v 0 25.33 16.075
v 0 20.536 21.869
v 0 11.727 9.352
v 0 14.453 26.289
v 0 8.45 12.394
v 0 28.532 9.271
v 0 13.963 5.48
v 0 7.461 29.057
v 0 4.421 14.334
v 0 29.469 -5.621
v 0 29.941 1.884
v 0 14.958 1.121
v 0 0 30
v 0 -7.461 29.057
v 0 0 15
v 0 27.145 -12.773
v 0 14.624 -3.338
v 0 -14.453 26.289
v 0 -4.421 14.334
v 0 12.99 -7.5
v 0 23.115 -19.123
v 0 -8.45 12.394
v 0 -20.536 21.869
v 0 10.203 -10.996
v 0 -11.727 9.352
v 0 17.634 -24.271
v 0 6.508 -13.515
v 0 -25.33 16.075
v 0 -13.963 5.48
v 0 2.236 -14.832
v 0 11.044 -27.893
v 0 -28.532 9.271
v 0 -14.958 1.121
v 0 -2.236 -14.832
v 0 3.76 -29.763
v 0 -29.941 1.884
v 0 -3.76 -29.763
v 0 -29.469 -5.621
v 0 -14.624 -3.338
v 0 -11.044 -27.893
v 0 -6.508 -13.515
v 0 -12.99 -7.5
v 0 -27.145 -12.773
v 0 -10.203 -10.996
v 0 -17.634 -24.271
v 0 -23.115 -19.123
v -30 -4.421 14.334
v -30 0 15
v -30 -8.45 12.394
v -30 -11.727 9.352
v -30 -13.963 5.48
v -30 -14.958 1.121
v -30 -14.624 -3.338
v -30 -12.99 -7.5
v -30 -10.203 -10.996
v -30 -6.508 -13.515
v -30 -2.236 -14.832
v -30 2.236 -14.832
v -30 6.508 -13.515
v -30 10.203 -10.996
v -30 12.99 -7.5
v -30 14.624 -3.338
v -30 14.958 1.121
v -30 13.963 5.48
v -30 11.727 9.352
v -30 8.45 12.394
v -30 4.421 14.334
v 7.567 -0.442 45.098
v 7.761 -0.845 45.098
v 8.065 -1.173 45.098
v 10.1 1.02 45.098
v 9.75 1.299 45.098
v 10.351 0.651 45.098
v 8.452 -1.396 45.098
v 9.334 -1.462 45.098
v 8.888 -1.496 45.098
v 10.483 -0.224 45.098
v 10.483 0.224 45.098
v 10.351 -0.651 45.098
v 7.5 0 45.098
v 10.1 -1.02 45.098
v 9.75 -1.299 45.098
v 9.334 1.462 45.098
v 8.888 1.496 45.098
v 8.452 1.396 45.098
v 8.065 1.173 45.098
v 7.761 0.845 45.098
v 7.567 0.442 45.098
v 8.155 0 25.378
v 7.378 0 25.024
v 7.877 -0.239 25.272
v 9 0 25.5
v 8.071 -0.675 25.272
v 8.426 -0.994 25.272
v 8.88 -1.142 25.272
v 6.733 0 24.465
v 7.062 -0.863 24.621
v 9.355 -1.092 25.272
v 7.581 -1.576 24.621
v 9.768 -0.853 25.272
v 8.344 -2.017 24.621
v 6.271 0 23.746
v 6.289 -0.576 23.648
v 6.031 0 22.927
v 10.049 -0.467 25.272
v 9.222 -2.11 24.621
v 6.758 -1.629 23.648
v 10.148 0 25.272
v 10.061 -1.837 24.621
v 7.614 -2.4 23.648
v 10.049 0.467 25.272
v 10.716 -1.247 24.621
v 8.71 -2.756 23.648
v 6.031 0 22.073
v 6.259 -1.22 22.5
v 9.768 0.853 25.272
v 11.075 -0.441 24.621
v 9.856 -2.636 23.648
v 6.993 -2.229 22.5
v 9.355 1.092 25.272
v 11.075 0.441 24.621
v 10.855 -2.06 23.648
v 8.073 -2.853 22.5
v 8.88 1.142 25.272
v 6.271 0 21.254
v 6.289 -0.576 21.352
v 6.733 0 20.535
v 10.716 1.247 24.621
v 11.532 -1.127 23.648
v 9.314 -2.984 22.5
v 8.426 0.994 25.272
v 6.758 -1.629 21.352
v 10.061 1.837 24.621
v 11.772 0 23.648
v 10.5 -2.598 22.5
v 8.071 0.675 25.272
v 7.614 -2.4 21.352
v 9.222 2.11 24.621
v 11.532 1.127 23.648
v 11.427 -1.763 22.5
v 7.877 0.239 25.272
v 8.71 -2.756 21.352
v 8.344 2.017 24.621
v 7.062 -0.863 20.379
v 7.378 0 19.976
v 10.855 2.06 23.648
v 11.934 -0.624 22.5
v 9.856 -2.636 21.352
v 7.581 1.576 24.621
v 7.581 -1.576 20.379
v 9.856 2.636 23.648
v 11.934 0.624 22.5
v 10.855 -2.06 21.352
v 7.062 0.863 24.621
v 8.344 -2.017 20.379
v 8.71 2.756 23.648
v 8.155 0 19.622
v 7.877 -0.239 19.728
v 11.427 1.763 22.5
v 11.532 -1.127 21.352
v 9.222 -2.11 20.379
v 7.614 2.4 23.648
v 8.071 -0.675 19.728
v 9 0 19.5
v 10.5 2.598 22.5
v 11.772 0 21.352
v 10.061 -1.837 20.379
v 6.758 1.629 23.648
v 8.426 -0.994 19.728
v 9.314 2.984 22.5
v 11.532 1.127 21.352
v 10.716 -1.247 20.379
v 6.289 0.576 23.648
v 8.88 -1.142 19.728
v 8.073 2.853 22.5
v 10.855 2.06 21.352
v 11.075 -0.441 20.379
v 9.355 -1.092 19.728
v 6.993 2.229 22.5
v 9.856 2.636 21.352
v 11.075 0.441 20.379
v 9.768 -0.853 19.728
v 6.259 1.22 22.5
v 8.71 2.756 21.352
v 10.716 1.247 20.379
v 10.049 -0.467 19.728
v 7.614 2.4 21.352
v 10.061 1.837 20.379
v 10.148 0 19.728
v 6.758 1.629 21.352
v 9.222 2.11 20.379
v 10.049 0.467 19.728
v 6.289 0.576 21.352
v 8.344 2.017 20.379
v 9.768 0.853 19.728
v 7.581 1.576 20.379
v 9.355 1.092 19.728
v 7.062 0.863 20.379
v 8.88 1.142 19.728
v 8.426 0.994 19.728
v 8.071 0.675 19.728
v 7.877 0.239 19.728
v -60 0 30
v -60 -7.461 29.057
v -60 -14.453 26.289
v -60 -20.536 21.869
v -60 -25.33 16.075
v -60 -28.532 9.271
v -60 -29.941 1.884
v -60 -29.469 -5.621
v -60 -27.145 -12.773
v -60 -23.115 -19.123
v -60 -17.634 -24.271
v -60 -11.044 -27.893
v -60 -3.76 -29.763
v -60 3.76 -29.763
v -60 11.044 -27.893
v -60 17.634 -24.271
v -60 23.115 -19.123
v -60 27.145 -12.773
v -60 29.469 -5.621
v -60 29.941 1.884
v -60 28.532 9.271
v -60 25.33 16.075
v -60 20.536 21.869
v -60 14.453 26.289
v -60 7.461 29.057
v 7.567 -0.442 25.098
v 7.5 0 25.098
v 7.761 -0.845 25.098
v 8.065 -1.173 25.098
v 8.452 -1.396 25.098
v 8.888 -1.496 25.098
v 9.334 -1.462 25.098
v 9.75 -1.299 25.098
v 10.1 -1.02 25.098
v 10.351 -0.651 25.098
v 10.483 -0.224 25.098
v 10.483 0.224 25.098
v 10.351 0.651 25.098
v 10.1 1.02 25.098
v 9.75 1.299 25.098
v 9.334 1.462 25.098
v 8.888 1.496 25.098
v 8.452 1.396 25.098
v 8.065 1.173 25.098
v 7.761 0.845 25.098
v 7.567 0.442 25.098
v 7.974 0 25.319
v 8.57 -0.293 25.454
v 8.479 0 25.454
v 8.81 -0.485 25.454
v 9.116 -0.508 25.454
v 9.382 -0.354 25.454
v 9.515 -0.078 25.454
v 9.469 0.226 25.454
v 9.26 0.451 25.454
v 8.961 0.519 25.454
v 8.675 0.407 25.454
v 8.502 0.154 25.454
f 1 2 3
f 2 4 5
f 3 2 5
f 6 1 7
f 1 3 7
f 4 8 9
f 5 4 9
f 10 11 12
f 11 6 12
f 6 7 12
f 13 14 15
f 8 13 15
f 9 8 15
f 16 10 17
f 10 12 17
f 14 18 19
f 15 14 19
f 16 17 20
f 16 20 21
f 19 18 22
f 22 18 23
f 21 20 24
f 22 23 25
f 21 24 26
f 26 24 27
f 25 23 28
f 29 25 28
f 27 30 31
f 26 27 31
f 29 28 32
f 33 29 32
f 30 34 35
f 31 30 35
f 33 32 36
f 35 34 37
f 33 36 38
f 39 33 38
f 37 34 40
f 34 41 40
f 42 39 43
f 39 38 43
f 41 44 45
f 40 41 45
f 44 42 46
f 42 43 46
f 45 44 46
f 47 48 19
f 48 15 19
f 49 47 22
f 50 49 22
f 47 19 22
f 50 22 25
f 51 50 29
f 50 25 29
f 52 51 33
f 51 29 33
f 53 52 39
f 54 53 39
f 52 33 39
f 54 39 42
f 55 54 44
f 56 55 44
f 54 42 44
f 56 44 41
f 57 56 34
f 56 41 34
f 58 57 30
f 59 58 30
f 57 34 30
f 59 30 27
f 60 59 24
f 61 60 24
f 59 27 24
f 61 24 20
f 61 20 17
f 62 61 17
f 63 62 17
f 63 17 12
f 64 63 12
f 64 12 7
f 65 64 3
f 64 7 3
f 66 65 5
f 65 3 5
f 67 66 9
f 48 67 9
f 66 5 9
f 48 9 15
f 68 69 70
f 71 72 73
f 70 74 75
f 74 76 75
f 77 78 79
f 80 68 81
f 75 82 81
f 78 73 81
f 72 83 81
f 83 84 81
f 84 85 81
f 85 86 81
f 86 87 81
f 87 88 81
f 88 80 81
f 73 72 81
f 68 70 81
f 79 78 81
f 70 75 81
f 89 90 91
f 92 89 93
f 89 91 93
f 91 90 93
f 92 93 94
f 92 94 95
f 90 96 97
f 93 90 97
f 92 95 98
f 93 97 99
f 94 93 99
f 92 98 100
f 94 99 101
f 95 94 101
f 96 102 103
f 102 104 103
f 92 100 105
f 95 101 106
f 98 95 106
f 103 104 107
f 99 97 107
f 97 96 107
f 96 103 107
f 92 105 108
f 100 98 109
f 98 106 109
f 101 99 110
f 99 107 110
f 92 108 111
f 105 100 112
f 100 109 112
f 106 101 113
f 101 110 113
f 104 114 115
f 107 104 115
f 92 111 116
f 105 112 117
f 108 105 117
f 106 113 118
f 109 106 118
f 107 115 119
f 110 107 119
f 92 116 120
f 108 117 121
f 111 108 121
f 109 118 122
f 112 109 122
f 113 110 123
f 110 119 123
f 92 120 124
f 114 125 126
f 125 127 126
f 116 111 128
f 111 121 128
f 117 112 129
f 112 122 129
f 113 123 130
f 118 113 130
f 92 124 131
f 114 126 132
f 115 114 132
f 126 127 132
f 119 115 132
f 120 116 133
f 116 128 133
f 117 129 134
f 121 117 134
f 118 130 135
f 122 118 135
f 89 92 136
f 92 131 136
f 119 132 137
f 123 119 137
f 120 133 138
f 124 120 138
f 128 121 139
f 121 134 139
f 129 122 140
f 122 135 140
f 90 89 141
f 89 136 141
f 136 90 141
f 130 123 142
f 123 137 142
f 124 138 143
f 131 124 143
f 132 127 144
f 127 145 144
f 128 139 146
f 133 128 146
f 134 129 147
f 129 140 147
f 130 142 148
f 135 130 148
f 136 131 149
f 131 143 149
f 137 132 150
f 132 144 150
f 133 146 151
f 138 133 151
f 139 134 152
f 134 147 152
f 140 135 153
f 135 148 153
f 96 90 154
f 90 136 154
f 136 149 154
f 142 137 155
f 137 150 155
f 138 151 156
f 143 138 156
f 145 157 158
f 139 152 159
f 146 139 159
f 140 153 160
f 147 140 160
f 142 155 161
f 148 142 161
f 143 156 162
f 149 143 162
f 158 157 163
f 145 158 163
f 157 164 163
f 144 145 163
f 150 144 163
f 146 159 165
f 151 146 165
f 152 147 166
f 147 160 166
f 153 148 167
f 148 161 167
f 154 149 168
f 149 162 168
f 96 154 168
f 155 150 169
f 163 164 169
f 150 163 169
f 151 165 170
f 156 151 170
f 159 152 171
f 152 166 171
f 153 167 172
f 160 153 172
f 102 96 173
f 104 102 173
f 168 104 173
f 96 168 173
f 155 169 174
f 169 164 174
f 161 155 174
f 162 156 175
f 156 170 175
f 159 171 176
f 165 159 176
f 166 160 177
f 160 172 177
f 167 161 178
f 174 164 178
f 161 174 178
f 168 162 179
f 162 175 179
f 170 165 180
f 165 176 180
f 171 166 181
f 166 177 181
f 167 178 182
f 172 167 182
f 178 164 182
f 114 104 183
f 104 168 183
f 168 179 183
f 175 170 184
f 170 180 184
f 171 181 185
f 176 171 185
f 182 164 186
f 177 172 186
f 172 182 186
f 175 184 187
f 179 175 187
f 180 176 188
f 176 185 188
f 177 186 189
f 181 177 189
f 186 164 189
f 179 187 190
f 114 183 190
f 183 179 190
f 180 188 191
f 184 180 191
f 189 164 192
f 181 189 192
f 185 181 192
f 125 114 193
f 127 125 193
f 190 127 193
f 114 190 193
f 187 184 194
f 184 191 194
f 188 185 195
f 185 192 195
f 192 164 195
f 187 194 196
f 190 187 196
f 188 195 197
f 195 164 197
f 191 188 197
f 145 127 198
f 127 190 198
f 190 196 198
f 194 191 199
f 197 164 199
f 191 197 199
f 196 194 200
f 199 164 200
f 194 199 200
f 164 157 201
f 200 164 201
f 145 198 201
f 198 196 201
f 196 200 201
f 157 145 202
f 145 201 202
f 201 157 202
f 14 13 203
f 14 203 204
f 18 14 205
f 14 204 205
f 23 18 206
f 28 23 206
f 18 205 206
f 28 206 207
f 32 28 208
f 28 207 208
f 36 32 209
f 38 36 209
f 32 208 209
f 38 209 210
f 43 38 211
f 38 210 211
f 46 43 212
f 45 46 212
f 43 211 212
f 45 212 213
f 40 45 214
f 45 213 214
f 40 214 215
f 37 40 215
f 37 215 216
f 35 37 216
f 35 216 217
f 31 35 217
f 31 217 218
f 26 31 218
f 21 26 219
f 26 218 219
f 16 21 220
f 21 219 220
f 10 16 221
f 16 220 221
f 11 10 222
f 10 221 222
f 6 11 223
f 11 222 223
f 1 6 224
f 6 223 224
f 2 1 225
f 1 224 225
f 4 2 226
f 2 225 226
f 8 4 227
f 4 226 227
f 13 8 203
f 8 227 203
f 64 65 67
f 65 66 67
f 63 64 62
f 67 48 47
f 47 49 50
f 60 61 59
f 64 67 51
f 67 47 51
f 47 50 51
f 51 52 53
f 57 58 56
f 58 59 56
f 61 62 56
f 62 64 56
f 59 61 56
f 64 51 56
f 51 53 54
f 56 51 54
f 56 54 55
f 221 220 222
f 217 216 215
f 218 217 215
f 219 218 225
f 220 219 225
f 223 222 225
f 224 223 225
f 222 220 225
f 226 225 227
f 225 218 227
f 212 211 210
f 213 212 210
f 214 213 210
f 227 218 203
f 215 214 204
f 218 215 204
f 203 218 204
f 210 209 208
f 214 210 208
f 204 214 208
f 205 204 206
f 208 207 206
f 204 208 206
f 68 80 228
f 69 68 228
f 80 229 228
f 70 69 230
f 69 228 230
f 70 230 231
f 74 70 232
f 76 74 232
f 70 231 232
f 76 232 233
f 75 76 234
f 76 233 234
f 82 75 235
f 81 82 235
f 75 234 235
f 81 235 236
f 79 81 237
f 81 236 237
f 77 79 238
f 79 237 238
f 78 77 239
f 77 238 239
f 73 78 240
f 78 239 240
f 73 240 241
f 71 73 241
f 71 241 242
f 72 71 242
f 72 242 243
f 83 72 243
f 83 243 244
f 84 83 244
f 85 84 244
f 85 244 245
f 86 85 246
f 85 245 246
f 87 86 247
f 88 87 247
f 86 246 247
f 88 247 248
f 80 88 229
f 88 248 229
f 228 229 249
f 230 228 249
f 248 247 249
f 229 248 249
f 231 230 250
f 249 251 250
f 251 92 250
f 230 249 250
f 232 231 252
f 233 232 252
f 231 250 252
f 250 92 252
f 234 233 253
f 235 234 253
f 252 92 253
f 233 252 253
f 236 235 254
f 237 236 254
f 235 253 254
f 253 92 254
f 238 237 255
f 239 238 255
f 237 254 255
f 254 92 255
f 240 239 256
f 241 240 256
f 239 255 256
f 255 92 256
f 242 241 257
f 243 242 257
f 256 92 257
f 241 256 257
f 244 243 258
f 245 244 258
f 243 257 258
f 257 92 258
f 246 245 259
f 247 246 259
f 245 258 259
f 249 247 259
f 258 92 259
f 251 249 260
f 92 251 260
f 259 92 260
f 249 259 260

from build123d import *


with BuildPart() as f1:
    # F0 (on Front) → F1 (revolve)
    with BuildSketch(Plane.XZ):
        Polygon((0, 30), (-60, 30), (-60, 0), (-30, 0), (-30, 15), (0, 15), align=None)
    revolve(axis=Axis((-30, 0, 0), (1, 0, 0)))


with BuildPart() as f3:
    # F2 (on Front) → F3 (revolve)
    with BuildSketch(Plane.XZ):
        with BuildLine():
            Line((9, 19.5), (9, 25.5))
            ThreePointArc((9, 25.5), (6, 22.5), (9, 19.5))
        make_face()
    revolve(axis=Axis((9, 0, 29.365131), (0, 0, 1)))


with BuildPart() as f5:
    # F4 (on Front) → F5 (revolve)
    with BuildSketch(Plane.XZ):
        with BuildLine():
            ThreePointArc((7.5, 25.098076), (8.223543, 25.397777), (9, 25.5))
            Line((9, 25.5), (9, 45.098076))
            Line((9, 45.098076), (7.5, 45.098076))
            Line((7.5, 45.098076), (7.5, 25.098076))
        make_face()
    revolve(axis=Axis((9, 0, 24.648131), (0, 0, 1)))


solid = Compound([f1.part, f3.part, f5.part])
